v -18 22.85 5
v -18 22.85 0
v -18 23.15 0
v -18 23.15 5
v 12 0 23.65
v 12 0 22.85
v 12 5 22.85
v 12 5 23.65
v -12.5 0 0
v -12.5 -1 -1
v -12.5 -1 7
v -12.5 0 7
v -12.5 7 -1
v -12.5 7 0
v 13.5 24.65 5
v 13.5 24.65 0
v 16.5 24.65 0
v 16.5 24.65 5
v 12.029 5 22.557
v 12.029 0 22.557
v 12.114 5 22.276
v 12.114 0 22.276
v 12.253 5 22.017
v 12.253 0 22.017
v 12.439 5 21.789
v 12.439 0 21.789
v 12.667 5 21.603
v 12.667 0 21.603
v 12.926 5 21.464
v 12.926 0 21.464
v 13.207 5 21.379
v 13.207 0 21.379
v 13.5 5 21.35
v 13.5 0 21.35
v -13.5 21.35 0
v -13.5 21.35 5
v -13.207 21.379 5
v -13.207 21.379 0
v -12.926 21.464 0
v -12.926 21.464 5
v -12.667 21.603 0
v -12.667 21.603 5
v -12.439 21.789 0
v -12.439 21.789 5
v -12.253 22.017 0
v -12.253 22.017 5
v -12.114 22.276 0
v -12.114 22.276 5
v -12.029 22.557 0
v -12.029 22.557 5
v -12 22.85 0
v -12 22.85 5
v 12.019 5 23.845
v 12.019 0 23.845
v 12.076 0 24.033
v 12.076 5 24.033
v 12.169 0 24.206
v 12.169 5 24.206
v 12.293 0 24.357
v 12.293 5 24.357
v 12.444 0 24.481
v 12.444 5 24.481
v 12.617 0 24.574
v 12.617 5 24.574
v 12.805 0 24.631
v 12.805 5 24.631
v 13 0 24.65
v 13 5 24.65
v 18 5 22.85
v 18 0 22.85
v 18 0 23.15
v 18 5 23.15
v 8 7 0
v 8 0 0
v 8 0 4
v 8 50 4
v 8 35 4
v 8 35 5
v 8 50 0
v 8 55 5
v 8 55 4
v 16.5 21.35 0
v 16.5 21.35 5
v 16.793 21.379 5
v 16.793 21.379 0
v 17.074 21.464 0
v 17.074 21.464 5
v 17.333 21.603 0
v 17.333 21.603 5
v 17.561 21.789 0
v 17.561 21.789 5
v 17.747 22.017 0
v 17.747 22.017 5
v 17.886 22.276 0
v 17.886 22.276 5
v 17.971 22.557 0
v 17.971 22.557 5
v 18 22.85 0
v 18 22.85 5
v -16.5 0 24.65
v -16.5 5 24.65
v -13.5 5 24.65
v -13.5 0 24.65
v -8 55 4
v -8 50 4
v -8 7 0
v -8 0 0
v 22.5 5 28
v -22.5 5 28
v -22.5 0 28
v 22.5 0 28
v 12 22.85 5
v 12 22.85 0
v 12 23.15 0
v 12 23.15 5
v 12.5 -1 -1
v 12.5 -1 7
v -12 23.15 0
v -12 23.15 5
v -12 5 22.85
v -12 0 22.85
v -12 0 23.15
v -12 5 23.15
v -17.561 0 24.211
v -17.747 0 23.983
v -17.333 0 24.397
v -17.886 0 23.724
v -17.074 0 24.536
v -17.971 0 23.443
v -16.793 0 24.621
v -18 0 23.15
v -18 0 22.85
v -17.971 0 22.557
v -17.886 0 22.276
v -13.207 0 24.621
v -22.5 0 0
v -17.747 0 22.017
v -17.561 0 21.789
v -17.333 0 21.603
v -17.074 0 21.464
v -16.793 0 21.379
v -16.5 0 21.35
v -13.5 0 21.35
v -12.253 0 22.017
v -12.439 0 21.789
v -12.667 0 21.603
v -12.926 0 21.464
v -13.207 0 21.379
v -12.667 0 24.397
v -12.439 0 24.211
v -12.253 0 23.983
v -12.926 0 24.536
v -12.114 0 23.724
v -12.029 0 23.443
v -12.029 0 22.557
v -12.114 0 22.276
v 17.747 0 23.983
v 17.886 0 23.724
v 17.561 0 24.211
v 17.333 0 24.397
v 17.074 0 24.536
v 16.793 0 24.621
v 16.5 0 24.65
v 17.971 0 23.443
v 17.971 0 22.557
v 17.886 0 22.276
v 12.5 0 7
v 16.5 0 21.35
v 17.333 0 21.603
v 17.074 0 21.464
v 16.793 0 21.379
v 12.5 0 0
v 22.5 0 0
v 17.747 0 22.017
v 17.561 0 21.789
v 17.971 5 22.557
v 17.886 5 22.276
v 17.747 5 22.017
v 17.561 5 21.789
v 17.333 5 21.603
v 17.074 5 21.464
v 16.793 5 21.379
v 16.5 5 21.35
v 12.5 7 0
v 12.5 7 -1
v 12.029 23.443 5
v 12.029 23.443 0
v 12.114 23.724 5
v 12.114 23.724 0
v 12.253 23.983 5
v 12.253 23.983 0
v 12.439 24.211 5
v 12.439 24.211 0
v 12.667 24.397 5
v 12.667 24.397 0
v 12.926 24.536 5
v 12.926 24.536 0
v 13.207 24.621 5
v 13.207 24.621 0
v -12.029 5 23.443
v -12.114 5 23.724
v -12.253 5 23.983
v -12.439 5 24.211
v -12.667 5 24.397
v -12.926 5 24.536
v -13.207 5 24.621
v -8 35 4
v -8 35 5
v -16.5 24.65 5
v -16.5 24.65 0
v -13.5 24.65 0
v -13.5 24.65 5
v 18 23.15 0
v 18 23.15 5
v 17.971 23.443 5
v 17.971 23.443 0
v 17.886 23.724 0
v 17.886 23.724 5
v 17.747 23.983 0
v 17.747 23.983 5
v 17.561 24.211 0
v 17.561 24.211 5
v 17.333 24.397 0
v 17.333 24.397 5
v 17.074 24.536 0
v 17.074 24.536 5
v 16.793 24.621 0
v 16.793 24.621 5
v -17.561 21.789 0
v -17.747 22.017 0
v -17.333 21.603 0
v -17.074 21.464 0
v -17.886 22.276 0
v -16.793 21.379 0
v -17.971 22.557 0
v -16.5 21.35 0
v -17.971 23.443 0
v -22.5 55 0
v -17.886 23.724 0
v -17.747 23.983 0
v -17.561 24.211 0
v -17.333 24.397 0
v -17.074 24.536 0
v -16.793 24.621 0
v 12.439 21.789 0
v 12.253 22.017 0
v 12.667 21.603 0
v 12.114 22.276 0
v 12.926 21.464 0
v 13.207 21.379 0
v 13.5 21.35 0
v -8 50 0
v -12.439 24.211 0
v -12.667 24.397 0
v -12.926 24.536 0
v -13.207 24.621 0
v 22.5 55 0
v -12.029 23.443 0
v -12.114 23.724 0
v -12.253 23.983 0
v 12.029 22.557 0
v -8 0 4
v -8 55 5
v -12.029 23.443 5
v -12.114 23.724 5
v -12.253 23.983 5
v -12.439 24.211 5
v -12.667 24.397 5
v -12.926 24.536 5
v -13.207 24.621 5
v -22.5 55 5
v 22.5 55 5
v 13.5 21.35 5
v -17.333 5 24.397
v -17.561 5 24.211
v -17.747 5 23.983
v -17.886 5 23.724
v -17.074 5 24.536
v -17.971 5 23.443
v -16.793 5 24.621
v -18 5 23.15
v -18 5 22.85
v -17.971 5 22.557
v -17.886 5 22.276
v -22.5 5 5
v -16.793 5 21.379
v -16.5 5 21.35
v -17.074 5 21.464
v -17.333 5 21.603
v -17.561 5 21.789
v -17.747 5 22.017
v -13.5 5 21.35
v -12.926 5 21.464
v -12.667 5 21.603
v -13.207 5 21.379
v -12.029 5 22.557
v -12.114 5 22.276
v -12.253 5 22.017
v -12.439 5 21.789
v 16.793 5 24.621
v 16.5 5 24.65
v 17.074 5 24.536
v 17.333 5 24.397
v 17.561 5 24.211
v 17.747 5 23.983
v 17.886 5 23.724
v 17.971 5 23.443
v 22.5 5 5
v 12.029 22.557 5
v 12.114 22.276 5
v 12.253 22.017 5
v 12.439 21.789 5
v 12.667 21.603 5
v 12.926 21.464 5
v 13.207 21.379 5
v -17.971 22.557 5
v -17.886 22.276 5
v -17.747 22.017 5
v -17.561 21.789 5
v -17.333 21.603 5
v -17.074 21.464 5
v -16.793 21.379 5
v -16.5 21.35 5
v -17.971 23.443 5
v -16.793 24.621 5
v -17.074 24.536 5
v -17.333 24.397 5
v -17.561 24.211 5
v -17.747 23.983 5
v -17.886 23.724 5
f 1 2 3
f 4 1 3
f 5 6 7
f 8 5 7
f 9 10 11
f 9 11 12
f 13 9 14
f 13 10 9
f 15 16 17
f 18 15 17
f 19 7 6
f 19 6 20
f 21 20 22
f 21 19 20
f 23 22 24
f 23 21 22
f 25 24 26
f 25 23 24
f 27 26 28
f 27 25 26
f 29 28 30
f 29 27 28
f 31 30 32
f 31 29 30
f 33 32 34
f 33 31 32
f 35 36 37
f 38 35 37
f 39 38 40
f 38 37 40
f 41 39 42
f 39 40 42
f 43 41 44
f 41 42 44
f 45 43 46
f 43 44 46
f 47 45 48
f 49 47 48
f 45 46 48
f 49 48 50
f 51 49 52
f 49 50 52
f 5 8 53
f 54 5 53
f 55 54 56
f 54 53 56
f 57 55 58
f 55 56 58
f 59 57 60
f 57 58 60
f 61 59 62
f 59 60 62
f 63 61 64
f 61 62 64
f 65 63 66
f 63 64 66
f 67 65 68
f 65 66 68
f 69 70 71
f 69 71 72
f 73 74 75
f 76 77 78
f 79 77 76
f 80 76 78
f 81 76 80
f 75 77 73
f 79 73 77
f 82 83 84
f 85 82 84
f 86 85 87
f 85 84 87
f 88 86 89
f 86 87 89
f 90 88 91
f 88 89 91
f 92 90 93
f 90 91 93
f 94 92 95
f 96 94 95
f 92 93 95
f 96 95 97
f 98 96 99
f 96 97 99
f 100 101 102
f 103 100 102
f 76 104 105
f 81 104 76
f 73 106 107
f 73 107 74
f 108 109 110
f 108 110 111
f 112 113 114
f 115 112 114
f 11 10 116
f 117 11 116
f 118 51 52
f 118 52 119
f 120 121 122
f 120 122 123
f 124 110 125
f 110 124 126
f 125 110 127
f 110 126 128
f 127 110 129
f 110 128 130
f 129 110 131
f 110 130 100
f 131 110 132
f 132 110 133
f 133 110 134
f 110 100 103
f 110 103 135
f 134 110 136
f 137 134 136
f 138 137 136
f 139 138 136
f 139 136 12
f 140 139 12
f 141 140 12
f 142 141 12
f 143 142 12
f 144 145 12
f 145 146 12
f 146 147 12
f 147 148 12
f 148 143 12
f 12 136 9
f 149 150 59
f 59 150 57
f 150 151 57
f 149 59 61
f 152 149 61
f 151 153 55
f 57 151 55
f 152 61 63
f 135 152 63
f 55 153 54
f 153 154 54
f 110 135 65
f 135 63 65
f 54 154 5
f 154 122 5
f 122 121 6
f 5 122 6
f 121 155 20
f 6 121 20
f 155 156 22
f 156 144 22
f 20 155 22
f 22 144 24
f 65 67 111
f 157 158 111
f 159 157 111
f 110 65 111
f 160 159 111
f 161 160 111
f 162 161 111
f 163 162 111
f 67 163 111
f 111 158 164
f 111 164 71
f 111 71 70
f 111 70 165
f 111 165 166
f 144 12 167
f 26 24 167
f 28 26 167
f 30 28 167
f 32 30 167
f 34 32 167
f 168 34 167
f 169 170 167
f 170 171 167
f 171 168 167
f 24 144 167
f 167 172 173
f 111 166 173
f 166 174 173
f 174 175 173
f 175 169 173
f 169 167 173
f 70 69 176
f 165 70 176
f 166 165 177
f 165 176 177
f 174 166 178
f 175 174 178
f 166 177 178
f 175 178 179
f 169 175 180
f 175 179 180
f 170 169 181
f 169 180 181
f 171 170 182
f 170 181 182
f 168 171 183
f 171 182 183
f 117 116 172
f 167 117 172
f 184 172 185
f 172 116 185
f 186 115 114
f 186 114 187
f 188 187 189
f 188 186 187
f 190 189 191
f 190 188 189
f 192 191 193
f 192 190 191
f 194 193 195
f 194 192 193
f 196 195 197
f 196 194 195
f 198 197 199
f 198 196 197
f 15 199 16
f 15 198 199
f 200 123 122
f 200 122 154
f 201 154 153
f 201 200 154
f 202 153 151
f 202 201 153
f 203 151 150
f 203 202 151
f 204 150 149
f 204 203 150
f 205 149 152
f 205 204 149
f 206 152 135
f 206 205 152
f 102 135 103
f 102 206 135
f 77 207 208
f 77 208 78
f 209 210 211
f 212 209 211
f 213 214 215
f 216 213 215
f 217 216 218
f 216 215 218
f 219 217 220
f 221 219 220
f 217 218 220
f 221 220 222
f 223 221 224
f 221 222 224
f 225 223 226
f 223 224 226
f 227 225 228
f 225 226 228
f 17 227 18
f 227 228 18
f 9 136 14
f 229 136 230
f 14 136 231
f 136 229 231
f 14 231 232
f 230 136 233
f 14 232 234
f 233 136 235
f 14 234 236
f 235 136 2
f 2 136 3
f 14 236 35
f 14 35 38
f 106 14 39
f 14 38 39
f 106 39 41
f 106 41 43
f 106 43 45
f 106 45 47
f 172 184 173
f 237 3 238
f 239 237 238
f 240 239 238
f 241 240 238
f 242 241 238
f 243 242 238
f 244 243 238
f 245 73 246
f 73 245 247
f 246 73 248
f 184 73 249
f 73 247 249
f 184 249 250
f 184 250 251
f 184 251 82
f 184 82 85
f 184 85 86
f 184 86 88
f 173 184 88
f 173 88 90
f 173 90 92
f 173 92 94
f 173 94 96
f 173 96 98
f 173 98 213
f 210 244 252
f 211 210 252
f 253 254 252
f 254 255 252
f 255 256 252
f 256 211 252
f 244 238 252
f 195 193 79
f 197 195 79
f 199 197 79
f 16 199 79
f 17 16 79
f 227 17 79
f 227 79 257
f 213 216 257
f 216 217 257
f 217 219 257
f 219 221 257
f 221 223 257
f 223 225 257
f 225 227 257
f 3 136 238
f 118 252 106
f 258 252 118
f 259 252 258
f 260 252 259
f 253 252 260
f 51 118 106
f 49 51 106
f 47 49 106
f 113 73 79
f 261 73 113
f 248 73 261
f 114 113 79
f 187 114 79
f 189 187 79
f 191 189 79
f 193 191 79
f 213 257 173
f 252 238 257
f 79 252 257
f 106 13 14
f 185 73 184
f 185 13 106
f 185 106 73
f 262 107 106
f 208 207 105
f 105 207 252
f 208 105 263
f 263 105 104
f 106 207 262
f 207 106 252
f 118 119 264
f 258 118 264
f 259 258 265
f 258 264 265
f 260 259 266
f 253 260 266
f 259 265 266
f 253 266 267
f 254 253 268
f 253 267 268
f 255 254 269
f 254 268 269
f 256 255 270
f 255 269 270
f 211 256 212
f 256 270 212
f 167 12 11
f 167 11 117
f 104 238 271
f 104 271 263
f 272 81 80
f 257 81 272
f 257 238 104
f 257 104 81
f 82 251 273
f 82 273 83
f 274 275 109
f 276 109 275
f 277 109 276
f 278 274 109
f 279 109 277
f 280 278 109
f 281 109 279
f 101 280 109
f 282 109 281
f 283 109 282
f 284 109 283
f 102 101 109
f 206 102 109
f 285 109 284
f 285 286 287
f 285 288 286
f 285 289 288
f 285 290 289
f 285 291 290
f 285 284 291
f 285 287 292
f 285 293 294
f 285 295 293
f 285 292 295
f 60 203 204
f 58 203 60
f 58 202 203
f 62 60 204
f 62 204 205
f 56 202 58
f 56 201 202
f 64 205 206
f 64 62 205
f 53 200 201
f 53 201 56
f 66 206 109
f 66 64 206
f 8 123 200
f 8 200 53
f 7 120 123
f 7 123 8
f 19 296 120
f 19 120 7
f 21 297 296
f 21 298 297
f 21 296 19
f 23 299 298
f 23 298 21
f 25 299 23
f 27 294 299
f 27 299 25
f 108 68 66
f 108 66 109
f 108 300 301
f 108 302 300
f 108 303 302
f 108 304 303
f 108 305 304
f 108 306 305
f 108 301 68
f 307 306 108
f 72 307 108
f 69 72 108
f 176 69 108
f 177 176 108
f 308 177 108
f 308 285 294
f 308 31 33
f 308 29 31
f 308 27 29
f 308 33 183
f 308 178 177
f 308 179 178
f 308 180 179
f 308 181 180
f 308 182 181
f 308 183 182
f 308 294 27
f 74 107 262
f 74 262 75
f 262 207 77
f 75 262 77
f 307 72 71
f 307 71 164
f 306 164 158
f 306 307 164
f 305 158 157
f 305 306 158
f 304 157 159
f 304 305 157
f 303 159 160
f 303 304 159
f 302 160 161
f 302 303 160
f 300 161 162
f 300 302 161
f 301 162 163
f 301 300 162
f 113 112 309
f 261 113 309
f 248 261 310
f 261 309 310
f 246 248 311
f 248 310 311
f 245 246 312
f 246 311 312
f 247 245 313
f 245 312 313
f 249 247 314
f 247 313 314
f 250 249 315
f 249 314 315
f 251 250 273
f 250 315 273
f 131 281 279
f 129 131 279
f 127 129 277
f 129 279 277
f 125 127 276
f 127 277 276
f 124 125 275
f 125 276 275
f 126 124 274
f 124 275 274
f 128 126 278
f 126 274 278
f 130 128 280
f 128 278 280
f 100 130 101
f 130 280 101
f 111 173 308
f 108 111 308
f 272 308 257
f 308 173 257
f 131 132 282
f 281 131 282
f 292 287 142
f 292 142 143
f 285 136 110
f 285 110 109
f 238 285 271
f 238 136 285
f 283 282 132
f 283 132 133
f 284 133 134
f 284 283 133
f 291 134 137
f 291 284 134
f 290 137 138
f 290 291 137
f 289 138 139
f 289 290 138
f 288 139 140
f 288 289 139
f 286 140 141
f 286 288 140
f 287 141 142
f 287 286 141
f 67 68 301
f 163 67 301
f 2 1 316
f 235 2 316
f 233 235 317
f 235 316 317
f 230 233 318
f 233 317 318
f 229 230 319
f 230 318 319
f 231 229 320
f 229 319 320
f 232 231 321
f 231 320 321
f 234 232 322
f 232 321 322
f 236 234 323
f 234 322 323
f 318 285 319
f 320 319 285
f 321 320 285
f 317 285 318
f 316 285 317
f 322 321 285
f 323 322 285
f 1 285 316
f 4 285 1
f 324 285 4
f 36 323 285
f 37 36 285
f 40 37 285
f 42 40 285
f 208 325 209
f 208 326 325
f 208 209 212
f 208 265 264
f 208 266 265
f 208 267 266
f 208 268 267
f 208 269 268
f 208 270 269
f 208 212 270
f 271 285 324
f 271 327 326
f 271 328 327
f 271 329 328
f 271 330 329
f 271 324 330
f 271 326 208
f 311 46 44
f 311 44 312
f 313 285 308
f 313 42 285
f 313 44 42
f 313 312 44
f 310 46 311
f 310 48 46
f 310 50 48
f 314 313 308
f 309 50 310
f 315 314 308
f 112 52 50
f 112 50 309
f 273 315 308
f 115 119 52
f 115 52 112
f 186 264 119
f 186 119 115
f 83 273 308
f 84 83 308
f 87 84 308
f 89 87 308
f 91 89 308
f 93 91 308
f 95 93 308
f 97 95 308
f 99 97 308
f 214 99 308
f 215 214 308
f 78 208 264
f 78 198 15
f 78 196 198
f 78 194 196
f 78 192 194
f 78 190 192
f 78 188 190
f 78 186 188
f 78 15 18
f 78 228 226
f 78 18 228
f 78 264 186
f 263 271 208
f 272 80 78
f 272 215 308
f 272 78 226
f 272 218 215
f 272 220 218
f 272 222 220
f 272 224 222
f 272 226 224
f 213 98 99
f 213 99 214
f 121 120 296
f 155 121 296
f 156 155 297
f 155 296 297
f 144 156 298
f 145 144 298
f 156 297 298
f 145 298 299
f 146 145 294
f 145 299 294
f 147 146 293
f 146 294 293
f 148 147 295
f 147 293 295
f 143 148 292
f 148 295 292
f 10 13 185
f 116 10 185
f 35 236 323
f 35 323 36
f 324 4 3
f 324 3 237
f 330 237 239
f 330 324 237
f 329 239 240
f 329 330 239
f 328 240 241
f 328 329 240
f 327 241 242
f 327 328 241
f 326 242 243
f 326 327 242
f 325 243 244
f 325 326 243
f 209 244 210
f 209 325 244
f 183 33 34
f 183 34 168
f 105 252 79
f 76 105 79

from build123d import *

# Parameters (mm, degrees)
BOX016_W      = 6
BOX016_H      = 10
BOX016_DEPTH  = 3.3
FILLET001_R   = 1.5
BOX013_W      = 6
BOX013_H      = 3.3
BOX013_DEPTH  = 10
FILLET003_R   = 1.5
BOX015_W      = 6
BOX015_H      = 10
BOX015_DEPTH  = 3.3
FILLET002_1_R = 1.5
FILLET002_2_R = 1
BOX012_W      = 16
BOX012_H      = 25
BOX012_DEPTH  = 6
BOX017_W      = 45
BOX017_H      = 50
BOX017_DEPTH  = 23
BOX014_W      = 6
BOX014_H      = 3.3
BOX014_DEPTH  = 10
FILLET_R      = 1.5
BOX009_W      = 16
BOX009_H      = 50
BOX009_DEPTH  = 4
BOX_W         = 45
BOX_H         = 55
BOX_DEPTH     = 28
BOX007_W      = 25
BOX007_H      = 8
BOX007_DEPTH  = 8


with BuildPart() as fillet001:
    # Box016 → Box016 (new body)
    with BuildSketch(Plane(origin=(-18, 0, 21.35), x_dir=(1, 0, 0), z_dir=(0, 0, 1))):
        with Locations((3, 5)):
            Rectangle(BOX016_W, BOX016_H)
    extrude(amount=BOX016_DEPTH)

    # Fillet001
    fillet001_edges = [fillet001.edges().sort_by_distance(p)[0] for p in [
        (-18, 5, 24.65),
        (-18, 5, 21.35),
        (-12, 5, 24.65),
        (-12, 5, 21.35),
    ]]
    fillet(fillet001_edges, radius=FILLET001_R)


with BuildPart() as fillet003:
    # Box013 → Box013 (new body)
    with BuildSketch(Plane(origin=(12, 21.35, 0), x_dir=(1, 0, 0), z_dir=(0, 0, 1))):
        with Locations((3, 1.65)):
            Rectangle(BOX013_W, BOX013_H)
    extrude(amount=BOX013_DEPTH)

    # Fillet003
    fillet003_edges = [fillet003.edges().sort_by_distance(p)[0] for p in [
        (12, 21.35, 5),
        (12, 24.65, 5),
        (18, 21.35, 5),
        (18, 24.65, 5),
    ]]
    fillet(fillet003_edges, radius=FILLET003_R)


with BuildPart() as fillet002:
    # Box015 → Box015 (new body)
    with BuildSketch(Plane(origin=(12, 0, 21.35), x_dir=(1, 0, 0), z_dir=(0, 0, 1))):
        with Locations((3, 5)):
            Rectangle(BOX015_W, BOX015_H)
    extrude(amount=BOX015_DEPTH)

    # Fillet002 1
    fillet002_1_edges = [fillet002.edges().sort_by_distance(p)[0] for p in [
        (12, 5, 21.35),
        (18, 5, 24.65),
        (18, 5, 21.35),
    ]]
    fillet(fillet002_1_edges, radius=FILLET002_1_R)

    # Fillet002 2
    fillet002_2_edges = [fillet002.edges().sort_by_distance(p)[0] for p in [
        (12, 5, 24.65),
    ]]
    fillet(fillet002_2_edges, radius=FILLET002_2_R)


with BuildPart() as box012:
    # Box012 → Box012 (new body)
    with BuildSketch(Plane(origin=(-8, 35, 4), x_dir=(1, 0, 0), z_dir=(0, 0, 1))):
        with Locations((8, 12.5)):
            Rectangle(BOX012_W, BOX012_H)
    extrude(amount=BOX012_DEPTH)


with BuildPart() as box017:
    # Box017 → Box017 (new body)
    with BuildSketch(Plane(origin=(-22.5, 5, 5), x_dir=(1, 0, 0), z_dir=(0, 0, 1))):
        with Locations((22.5, 25)):
            Rectangle(BOX017_W, BOX017_H)
    extrude(amount=BOX017_DEPTH)


with BuildPart() as fillet_body:
    # Box014 → Box014 (new body)
    with BuildSketch(Plane(origin=(-18, 21.35, 0), x_dir=(1, 0, 0), z_dir=(0, 0, 1))):
        with Locations((3, 1.65)):
            Rectangle(BOX014_W, BOX014_H)
    extrude(amount=BOX014_DEPTH)

    # Fillet
    fillet_edges = [fillet_body.edges().sort_by_distance(p)[0] for p in [
        (-18, 21.35, 5),
        (-18, 24.65, 5),
        (-12, 21.35, 5),
        (-12, 24.65, 5),
    ]]
    fillet(fillet_edges, radius=FILLET_R)


with BuildPart() as fusion001:
    # Box009 → Box009 (new body)
    with BuildSketch(Plane(origin=(-8, 0, 0), x_dir=(1, 0, 0), z_dir=(0, 0, 1))):
        with Locations((8, 25)):
            Rectangle(BOX009_W, BOX009_H)
    extrude(amount=BOX009_DEPTH)

    # Fusion001: union Fillet001, Fillet003, Fillet002, Box012, Box017, Fillet body
    add(fillet001.part)
    add(fillet003.part)
    add(fillet002.part)
    add(box012.part)
    add(box017.part)
    add(fillet_body.part)


with BuildPart() as box:
    # Box → Box (new body)
    with BuildSketch(Plane(origin=(-22.5, 0, 0), x_dir=(1, 0, 0), z_dir=(0, 0, 1))):
        with Locations((22.5, 27.5)):
            Rectangle(BOX_W, BOX_H)
    extrude(amount=BOX_DEPTH)


with BuildPart() as cut:
    # Box007 → Box007 (new body)
    with BuildSketch(Plane(origin=(-12.5, -1, -1), x_dir=(1, 0, 0), z_dir=(0, 0, 1))):
        with Locations((12.5, 4)):
            Rectangle(BOX007_W, BOX007_H)
    extrude(amount=BOX007_DEPTH)

    # Fusion: union Box
    add(box.part)

    # Cut: cut Fusion001
    add(fusion001.part, mode=Mode.SUBTRACT)


solid = cut.part
